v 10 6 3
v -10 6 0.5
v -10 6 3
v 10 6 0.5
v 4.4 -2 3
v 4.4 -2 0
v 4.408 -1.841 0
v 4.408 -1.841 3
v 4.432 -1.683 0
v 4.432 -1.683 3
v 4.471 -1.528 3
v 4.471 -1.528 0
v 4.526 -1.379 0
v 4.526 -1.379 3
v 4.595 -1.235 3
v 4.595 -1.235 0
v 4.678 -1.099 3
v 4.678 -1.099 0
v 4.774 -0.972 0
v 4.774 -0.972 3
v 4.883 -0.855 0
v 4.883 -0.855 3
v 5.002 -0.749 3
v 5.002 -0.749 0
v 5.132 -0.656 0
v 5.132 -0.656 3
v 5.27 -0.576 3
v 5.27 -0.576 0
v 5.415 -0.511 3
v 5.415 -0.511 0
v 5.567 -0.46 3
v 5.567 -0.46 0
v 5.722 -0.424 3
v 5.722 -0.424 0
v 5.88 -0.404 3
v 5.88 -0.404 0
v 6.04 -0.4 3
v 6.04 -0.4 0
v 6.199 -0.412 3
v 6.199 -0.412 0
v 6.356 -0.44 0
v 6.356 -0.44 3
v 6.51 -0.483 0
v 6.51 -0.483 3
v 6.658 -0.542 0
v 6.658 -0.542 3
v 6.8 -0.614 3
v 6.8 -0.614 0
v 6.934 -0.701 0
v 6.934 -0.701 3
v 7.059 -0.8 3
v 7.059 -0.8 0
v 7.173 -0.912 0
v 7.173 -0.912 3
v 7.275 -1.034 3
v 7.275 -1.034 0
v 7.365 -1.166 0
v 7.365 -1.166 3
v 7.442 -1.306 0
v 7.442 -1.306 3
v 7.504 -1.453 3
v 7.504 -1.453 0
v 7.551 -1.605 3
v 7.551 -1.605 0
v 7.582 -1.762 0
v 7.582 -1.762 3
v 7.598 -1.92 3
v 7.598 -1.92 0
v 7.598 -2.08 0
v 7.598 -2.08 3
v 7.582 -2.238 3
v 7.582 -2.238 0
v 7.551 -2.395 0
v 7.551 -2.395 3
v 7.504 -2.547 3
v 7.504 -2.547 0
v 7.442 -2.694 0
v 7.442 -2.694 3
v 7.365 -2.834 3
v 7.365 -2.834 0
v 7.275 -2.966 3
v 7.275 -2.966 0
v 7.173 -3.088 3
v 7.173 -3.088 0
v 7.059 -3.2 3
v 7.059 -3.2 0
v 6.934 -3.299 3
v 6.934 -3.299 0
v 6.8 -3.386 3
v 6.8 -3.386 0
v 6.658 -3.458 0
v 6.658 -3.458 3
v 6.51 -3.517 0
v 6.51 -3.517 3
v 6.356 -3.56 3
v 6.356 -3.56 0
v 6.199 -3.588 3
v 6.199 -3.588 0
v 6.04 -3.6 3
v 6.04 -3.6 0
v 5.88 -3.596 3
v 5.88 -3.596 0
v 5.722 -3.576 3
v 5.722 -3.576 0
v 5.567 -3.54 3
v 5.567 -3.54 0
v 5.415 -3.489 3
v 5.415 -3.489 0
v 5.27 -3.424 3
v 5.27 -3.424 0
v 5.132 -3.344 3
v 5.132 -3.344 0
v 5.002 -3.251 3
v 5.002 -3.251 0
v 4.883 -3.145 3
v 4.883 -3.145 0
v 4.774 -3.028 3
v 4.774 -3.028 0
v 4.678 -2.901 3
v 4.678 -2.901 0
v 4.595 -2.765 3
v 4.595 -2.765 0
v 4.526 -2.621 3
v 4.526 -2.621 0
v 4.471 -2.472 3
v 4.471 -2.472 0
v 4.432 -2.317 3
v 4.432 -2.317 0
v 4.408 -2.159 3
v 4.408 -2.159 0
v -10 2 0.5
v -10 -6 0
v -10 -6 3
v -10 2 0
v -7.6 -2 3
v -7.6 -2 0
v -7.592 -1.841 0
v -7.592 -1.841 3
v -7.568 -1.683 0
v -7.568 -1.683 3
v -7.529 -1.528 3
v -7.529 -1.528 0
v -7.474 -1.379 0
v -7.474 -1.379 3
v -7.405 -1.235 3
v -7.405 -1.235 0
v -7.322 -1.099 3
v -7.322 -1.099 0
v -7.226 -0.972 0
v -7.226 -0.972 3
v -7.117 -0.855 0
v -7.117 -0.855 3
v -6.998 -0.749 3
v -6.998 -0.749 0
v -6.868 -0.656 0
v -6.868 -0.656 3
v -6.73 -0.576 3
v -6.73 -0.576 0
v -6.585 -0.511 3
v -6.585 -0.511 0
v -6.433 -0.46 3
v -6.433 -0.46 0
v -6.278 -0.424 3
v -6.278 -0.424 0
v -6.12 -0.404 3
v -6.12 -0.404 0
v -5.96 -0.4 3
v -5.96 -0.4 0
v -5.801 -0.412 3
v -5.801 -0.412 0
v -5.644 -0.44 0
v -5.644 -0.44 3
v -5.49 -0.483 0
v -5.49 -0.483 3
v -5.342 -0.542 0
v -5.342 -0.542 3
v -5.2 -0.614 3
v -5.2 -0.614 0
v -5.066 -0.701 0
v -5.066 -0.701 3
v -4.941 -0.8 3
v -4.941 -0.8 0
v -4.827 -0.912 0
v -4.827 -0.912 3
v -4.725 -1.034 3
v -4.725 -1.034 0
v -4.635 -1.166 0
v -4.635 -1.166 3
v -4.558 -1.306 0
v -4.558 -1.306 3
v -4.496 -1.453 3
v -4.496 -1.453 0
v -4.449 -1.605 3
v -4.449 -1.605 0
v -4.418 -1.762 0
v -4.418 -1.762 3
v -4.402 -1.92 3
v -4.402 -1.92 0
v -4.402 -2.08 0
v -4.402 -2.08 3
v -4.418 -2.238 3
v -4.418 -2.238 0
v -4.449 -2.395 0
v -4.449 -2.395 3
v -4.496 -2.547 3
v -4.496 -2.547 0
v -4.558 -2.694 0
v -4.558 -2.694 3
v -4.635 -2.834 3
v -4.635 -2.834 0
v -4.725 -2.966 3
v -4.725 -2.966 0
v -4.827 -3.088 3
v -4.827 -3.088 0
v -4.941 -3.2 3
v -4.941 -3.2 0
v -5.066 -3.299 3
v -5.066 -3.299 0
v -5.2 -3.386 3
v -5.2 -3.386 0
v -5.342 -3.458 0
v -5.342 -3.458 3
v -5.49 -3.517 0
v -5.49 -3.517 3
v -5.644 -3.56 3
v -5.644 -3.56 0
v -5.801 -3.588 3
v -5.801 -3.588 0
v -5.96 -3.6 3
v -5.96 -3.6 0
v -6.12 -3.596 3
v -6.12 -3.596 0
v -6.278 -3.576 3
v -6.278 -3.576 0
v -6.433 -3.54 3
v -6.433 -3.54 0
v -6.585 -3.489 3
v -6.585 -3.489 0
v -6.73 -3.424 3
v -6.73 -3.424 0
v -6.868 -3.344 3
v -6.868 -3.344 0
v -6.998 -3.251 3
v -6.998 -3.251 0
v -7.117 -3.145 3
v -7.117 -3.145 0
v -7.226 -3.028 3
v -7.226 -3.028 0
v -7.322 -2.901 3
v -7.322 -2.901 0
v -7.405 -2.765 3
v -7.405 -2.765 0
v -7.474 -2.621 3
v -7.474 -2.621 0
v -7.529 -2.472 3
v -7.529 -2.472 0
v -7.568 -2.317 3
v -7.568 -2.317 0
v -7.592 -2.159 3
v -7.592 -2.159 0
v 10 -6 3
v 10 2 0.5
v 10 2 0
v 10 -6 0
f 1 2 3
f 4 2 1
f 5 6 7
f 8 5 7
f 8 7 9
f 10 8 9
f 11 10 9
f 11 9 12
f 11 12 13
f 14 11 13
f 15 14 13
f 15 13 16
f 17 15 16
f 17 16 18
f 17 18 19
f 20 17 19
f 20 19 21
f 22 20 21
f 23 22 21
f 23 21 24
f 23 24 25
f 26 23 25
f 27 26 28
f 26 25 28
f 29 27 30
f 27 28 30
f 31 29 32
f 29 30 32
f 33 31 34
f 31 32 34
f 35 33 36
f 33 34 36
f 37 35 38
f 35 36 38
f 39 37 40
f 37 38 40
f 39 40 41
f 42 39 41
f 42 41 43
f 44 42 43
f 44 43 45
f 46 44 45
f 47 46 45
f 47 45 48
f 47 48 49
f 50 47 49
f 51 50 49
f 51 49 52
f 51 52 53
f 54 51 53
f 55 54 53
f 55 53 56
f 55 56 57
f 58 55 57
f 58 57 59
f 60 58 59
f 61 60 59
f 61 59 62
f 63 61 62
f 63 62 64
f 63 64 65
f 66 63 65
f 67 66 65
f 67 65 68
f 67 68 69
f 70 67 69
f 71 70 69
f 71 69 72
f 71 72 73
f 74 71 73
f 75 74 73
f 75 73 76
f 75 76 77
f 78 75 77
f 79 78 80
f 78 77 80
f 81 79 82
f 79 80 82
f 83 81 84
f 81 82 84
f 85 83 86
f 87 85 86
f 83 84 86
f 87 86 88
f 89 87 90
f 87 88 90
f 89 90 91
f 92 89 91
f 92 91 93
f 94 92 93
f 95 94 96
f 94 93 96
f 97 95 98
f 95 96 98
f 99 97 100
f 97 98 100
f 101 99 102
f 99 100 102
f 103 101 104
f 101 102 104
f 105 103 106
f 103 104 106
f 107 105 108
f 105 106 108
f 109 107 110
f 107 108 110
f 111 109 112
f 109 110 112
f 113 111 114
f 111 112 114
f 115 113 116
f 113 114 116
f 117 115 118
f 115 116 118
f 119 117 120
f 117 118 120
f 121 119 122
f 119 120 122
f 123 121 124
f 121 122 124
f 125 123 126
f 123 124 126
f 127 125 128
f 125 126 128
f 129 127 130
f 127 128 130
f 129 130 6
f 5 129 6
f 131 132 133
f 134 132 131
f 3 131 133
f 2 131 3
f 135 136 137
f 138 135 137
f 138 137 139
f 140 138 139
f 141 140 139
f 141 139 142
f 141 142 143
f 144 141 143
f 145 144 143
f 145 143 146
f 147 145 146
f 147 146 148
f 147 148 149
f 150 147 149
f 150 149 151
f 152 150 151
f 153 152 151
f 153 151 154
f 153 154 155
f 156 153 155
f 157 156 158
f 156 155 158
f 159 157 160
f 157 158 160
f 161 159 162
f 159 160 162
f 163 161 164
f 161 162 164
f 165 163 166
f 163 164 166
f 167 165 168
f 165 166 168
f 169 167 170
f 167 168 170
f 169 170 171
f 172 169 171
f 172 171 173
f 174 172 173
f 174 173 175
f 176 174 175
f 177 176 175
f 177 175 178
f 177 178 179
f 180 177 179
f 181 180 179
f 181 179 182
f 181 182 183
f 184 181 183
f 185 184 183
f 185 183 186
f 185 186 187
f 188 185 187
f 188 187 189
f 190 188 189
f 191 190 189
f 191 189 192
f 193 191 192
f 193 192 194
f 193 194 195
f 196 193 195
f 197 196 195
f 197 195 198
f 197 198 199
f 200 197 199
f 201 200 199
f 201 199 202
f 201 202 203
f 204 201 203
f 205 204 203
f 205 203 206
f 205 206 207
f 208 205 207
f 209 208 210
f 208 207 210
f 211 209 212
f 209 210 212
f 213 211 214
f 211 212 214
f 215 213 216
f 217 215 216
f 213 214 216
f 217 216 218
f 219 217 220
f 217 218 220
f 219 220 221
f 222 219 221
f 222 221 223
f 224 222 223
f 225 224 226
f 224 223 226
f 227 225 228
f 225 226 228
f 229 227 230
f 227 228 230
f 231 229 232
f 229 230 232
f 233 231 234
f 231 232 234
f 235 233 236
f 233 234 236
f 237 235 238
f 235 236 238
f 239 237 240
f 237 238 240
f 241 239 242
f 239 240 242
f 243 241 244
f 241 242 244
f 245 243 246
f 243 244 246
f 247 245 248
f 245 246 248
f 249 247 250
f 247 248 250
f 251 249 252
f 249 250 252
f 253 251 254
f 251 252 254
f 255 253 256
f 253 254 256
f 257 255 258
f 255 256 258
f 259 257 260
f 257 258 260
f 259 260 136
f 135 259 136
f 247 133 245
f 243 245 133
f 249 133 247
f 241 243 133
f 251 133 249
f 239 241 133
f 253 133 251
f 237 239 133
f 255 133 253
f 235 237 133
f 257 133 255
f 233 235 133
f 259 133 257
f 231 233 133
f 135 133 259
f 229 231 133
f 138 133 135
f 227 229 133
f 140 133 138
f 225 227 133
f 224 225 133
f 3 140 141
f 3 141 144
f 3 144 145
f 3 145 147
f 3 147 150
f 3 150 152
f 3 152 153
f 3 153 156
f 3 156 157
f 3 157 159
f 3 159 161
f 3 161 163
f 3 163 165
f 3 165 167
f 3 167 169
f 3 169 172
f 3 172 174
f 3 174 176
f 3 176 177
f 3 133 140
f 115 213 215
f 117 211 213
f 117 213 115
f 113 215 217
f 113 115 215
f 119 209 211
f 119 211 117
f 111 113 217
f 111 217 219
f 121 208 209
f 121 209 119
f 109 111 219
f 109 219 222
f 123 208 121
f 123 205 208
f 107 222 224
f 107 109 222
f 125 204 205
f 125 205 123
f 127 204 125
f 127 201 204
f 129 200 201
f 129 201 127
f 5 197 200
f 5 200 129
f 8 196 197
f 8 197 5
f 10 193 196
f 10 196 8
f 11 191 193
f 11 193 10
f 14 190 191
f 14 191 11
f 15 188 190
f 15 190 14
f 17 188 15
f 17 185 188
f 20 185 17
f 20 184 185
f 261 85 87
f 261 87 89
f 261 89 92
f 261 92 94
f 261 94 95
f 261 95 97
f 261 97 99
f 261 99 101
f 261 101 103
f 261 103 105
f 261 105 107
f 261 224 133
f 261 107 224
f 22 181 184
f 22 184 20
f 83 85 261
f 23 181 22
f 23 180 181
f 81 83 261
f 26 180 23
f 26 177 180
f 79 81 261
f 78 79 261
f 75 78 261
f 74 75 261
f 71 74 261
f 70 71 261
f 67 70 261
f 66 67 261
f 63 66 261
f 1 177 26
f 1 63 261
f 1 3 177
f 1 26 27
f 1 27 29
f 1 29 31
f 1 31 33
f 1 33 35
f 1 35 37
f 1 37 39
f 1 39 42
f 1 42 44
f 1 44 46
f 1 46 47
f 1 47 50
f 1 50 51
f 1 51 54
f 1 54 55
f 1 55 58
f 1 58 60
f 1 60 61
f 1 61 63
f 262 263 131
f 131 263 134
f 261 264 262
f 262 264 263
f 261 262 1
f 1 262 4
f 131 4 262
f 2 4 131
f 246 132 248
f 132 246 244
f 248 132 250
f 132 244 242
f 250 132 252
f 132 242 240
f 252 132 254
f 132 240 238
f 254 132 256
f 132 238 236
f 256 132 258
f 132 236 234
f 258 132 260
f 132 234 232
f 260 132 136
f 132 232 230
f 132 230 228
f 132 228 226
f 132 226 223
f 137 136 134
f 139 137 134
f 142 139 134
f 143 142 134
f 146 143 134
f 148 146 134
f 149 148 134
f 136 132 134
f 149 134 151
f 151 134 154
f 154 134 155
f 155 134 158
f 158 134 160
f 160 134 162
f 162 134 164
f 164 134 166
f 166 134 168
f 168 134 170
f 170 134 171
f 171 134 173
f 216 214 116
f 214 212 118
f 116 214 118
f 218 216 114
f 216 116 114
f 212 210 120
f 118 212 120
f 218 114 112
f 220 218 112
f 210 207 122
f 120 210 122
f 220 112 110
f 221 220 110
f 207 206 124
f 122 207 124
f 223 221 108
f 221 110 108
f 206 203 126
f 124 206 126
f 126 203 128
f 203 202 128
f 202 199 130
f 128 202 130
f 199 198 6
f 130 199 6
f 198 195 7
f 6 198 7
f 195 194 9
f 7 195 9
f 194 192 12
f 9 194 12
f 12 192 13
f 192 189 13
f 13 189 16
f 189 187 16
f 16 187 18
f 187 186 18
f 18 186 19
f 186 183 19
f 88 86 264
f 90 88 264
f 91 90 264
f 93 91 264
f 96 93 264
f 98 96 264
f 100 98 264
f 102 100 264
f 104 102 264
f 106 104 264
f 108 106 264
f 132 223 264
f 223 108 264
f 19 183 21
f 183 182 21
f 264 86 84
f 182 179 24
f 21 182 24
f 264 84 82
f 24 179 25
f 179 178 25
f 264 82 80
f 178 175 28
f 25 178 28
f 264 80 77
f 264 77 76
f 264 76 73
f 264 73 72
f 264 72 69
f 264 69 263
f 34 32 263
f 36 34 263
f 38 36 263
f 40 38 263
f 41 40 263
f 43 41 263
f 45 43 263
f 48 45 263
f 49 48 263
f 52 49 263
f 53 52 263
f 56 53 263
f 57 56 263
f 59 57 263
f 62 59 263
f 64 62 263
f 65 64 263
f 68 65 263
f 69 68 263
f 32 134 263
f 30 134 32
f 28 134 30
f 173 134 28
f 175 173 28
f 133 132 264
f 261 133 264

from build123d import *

# Parameters (mm, degrees)
SKETCH1_W            = 20
SKETCH1_H            = 12
BOSS_EXTRUDE1_DEPTH  = 3
SKETCH2_W            = 20
SKETCH2_H            = 4
CUT_EXTRUDE1_DEPTH   = 0.5
M3_CLEARANCE_HOLE1_D = 3.2


with BuildPart() as part:
    # Sketch1 → Boss-Extrude1 (new body)
    with BuildSketch(Plane.XY):
        Rectangle(SKETCH1_W, SKETCH1_H)
    extrude(amount=BOSS_EXTRUDE1_DEPTH)

    # Sketch2 → Cut-Extrude1 (cut)
    with BuildSketch(Plane(origin=(0, 0, 0), x_dir=(-1, 0, 0), z_dir=(0, 0, -1))):
        with Locations((0, 4)):
            Rectangle(SKETCH2_W, SKETCH2_H)
    extrude(amount=-CUT_EXTRUDE1_DEPTH, mode=Mode.SUBTRACT)

    # M3 Clearance Hole1 (through all)
    with Locations(Plane.XY.offset(3)):
        with Locations((-6, -2), (6, -2)):
            Hole(M3_CLEARANCE_HOLE1_D / 2)


solid = part.part
